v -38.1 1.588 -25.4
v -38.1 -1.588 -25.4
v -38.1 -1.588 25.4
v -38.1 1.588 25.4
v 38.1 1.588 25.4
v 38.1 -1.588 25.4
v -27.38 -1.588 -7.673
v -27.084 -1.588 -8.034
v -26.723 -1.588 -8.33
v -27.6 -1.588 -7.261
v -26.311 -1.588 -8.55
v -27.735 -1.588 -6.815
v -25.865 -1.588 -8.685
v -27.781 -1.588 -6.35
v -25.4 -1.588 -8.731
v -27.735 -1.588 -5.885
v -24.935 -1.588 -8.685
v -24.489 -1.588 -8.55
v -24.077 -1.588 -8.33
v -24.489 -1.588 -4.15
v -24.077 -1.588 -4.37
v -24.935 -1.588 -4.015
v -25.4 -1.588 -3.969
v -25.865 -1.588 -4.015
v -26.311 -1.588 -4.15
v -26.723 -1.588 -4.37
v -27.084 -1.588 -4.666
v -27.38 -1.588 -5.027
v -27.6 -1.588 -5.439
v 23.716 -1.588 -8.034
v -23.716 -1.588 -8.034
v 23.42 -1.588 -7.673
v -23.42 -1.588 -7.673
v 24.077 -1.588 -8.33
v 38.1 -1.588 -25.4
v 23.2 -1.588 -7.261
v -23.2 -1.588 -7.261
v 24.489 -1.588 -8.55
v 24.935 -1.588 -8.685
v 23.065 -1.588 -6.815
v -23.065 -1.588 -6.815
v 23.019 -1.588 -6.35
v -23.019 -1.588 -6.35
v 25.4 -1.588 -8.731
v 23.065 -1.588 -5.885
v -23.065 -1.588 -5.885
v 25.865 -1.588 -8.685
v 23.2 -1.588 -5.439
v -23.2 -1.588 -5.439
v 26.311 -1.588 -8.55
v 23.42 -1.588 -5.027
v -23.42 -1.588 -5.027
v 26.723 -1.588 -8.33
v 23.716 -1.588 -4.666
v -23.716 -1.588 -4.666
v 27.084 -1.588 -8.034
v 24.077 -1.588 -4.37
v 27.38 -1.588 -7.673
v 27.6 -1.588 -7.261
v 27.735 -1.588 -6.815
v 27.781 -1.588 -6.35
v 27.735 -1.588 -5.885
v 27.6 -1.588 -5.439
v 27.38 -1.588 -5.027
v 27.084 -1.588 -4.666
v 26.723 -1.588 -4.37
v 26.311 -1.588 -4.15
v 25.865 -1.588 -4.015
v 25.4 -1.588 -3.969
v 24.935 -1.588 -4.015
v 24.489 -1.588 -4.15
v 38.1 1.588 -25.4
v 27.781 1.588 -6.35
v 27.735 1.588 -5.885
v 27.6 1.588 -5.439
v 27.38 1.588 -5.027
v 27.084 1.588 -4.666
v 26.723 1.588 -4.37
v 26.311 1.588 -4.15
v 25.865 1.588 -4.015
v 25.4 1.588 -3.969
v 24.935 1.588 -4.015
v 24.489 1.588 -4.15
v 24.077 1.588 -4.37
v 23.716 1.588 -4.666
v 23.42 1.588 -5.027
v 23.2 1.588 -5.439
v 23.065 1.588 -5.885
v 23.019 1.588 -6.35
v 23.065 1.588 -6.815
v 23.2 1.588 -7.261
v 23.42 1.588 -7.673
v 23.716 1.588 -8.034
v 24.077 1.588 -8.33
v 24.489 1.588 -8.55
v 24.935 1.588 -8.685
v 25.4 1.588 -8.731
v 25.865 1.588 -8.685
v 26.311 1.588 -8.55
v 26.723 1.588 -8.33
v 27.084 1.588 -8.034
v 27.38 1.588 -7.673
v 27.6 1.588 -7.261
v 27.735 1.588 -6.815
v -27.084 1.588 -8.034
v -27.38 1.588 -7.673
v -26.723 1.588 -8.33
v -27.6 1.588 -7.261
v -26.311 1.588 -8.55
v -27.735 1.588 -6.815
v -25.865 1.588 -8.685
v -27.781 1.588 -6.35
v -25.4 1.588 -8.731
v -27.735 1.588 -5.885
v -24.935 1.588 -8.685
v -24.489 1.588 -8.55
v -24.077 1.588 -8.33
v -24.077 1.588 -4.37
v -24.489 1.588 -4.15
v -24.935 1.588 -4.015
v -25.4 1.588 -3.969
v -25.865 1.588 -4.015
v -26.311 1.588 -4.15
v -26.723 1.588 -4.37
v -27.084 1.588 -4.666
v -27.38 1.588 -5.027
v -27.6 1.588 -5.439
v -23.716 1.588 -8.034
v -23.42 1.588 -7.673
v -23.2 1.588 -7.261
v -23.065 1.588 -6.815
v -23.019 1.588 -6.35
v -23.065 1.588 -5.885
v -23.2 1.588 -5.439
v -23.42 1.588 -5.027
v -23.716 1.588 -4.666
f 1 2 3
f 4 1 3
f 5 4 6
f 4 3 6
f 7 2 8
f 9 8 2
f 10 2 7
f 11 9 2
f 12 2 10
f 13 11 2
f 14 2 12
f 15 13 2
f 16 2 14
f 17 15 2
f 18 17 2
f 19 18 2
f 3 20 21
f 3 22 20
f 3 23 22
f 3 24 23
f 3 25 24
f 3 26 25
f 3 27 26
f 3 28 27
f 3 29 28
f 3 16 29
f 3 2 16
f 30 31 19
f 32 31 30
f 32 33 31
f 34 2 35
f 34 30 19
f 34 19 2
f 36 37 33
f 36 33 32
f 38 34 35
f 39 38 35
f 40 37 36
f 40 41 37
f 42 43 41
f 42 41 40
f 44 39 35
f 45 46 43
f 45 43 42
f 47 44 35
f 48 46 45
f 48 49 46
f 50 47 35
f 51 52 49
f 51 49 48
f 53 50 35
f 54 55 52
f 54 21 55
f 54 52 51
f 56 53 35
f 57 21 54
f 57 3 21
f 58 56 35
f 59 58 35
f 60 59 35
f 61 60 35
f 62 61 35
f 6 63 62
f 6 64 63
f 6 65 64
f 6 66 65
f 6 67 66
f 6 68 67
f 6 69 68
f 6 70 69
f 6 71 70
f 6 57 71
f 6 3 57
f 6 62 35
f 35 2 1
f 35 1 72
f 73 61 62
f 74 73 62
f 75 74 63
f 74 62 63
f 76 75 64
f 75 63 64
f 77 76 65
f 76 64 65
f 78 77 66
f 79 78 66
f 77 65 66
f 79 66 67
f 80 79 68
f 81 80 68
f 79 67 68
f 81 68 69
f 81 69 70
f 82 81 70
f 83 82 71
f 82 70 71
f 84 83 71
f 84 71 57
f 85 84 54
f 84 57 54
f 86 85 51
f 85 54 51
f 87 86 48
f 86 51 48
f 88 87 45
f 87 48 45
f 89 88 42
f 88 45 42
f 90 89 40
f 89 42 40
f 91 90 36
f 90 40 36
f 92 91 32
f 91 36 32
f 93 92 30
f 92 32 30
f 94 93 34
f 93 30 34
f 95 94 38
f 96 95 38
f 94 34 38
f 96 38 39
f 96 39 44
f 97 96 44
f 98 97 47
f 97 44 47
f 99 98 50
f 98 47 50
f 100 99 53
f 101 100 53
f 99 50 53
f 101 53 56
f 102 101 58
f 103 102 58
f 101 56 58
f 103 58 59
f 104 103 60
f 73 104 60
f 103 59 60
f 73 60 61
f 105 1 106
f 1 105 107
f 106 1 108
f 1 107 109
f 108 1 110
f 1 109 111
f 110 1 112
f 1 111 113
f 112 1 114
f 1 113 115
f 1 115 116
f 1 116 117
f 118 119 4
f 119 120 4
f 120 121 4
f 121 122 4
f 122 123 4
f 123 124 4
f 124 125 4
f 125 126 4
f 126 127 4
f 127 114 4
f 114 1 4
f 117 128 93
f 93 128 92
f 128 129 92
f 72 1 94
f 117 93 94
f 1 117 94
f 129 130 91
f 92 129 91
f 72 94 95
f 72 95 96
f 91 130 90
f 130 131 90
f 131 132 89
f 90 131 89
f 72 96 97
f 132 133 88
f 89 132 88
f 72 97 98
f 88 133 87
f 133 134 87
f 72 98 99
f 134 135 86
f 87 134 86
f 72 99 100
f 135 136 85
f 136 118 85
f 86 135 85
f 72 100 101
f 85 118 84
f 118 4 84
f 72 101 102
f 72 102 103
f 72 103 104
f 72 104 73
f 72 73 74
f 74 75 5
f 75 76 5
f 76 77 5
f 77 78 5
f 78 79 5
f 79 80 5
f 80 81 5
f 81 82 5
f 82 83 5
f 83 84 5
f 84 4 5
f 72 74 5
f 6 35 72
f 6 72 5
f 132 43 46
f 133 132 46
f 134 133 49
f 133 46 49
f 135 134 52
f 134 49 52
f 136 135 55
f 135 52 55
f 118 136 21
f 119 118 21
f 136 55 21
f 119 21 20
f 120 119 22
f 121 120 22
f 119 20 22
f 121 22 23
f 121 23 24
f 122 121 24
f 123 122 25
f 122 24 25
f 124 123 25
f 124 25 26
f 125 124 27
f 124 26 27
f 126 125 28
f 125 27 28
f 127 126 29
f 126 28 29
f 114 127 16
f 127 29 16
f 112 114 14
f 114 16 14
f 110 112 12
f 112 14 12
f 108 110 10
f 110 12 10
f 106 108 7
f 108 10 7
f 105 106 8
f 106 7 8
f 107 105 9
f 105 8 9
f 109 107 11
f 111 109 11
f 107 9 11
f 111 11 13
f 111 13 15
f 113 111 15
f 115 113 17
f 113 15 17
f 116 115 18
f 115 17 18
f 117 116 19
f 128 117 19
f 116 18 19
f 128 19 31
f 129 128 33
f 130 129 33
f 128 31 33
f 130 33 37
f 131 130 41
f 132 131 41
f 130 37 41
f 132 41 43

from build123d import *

# Parameters (mm, degrees)
F0_W     = 76.2
F0_H     = 50.8
F1_DEPTH = 1.5875
F2_R     = 2.38125
F4_DEPTH = 3.175
F3_R     = 2.38125
F5_DEPTH = 3.175


with BuildPart() as f1:
    # F0 (on Front) → F1 (new body, symmetric)
    with BuildSketch(Plane.XZ):
        Rectangle(F0_W, F0_H)
    extrude(amount=F1_DEPTH, both=True)

    # F2 (on face) → F4 (cut)
    with BuildSketch(Plane.XZ.offset(1.5875)):
        with Locations((-25.4, -6.35)):
            Circle(F2_R)
    extrude(amount=-F4_DEPTH, mode=Mode.SUBTRACT)

    # F3 (on face) → F5 (cut)
    with BuildSketch(Plane.XZ.offset(1.5875)):
        with Locations((25.4, -6.35)):
            Circle(F3_R)
    extrude(amount=-F5_DEPTH, mode=Mode.SUBTRACT)


solid = f1.part
